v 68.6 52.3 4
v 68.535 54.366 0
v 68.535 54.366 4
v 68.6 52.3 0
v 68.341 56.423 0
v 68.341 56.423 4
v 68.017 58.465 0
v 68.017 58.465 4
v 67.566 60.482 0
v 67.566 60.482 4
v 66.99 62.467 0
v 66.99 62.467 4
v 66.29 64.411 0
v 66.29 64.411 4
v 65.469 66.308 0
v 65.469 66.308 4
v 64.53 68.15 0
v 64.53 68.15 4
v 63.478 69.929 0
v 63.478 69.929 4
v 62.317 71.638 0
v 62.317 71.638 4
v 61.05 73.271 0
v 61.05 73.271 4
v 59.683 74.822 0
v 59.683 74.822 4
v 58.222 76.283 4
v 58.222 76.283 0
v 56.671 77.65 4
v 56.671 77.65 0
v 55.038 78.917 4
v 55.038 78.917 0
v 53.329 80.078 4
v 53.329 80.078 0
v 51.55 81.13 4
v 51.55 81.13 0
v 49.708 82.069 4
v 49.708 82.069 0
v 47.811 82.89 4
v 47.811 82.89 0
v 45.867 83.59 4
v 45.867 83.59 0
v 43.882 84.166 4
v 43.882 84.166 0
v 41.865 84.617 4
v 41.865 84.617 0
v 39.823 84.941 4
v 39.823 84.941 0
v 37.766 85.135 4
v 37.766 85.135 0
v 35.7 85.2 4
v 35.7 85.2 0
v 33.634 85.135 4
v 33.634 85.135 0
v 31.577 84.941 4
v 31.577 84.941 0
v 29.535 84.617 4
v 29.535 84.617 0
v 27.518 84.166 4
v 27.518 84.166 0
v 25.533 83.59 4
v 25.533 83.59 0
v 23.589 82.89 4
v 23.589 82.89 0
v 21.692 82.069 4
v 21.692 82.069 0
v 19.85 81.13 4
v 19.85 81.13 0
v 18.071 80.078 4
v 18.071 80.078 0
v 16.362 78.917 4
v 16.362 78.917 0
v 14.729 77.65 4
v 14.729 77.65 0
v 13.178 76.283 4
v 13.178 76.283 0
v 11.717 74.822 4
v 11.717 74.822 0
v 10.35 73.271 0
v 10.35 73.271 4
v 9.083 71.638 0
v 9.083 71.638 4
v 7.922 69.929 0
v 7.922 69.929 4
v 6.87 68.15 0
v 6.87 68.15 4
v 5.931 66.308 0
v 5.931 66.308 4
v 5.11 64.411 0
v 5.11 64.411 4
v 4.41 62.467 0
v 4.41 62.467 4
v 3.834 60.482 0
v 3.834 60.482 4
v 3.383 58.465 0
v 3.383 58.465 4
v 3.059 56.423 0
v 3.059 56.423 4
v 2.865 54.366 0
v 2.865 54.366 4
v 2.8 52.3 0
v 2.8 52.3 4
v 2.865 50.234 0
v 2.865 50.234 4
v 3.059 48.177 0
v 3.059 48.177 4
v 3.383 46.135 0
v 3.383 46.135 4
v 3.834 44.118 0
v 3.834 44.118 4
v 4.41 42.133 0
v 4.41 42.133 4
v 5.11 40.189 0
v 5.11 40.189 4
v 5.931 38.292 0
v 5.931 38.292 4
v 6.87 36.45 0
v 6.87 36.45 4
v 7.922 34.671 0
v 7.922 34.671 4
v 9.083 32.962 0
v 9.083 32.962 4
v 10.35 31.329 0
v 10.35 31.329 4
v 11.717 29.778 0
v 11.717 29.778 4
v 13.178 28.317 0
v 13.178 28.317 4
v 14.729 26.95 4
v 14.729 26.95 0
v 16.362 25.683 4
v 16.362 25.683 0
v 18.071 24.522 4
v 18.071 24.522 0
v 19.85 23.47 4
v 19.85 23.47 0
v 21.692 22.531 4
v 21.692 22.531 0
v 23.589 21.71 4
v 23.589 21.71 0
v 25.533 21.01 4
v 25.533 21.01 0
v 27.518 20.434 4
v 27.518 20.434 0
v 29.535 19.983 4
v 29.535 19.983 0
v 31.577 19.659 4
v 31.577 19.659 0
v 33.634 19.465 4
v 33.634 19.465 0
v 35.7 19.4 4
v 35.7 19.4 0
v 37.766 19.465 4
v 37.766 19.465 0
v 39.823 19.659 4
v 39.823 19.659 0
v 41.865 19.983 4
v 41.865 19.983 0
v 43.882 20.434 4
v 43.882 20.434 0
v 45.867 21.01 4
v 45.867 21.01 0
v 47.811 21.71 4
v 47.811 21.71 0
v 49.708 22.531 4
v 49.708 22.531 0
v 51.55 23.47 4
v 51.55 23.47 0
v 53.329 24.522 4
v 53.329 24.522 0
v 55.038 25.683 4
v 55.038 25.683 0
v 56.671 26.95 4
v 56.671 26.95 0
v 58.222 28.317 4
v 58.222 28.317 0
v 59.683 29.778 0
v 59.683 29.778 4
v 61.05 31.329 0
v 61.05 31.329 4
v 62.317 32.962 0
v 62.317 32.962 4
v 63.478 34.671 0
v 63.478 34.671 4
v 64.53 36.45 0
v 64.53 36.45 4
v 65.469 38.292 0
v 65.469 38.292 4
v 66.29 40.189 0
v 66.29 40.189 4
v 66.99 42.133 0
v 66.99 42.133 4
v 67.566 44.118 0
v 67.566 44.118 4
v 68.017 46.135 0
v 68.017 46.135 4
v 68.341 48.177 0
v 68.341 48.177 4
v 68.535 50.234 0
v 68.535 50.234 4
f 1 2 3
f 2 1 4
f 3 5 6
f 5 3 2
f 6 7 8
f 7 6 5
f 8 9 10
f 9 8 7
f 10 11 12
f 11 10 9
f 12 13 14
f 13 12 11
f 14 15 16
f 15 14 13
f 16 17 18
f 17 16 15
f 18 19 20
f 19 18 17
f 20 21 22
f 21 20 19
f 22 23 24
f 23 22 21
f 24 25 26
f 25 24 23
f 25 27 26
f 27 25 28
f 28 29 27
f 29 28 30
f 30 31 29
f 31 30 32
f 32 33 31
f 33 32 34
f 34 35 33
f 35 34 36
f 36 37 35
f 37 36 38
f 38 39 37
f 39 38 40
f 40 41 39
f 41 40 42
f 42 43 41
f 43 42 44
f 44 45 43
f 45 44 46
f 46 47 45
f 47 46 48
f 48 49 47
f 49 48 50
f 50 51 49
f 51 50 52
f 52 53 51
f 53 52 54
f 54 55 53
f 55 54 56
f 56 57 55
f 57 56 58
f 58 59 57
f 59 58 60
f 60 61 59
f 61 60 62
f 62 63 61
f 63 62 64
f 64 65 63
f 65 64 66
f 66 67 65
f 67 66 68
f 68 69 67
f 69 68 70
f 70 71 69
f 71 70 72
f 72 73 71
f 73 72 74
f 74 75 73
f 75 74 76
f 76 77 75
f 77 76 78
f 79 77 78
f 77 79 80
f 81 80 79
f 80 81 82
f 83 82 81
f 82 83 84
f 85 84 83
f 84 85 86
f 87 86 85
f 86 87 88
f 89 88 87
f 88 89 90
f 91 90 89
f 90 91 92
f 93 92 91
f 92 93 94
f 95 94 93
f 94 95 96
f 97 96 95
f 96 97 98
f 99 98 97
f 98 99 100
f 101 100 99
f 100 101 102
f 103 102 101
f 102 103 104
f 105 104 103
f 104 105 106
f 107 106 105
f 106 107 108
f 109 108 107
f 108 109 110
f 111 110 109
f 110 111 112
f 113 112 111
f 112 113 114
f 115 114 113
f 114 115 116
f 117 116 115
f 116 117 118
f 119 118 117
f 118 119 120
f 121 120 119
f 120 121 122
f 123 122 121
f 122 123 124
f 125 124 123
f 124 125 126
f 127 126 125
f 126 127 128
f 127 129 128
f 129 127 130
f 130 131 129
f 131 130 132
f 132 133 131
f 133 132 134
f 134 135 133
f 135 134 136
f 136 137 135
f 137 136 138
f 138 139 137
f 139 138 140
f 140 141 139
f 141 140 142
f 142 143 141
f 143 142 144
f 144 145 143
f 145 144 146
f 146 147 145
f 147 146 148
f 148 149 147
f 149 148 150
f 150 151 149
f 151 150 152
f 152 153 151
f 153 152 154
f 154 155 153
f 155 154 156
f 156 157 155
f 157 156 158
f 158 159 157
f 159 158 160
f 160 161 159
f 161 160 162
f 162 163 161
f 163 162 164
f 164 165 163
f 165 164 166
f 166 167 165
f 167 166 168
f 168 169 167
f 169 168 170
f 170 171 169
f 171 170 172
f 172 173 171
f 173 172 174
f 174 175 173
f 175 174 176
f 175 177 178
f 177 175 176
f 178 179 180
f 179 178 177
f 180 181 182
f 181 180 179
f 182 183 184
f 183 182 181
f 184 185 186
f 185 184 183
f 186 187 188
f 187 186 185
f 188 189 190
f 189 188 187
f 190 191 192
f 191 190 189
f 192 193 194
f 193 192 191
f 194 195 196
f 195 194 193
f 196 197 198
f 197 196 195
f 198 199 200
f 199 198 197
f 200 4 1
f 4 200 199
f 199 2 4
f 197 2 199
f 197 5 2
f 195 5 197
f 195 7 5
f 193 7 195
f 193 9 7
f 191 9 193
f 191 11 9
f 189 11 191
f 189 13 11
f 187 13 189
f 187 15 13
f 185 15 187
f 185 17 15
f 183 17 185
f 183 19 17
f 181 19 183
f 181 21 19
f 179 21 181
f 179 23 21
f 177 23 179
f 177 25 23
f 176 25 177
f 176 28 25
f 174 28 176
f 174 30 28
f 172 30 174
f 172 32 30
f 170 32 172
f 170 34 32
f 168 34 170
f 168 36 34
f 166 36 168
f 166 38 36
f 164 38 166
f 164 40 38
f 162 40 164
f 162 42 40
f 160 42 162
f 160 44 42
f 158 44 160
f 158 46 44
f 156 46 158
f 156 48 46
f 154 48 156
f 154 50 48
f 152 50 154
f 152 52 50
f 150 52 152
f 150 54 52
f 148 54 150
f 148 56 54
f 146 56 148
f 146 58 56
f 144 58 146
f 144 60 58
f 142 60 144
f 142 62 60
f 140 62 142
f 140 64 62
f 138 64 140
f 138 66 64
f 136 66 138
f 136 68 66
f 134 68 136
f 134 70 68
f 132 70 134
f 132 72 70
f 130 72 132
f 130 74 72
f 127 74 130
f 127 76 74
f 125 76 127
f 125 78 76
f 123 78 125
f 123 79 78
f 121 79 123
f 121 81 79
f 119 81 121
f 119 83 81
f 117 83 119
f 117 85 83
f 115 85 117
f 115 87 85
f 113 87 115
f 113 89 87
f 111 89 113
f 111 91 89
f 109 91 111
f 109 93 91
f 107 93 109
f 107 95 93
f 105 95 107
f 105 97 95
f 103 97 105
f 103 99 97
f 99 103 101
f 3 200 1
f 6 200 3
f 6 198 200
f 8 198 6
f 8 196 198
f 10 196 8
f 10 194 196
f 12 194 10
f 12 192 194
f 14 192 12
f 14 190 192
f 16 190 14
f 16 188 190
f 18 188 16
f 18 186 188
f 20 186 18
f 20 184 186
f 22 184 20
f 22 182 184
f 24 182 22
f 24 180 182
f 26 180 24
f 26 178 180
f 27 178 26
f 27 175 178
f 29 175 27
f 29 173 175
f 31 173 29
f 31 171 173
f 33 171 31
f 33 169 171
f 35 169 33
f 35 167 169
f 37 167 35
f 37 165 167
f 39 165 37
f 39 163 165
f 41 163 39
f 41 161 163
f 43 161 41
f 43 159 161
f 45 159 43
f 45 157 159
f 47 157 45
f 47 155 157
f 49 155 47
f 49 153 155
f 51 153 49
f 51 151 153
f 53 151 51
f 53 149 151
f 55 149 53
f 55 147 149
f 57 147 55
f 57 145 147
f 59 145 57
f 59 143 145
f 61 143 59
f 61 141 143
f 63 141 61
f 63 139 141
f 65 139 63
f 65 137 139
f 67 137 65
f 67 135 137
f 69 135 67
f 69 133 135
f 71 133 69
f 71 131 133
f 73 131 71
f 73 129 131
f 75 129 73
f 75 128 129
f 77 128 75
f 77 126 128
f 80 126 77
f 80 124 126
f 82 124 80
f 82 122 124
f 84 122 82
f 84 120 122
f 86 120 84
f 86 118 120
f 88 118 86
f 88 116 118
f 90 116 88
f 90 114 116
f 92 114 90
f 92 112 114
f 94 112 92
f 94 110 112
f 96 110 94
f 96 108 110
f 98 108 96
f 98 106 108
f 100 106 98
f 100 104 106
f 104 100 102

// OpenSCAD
// rma 
//  noisebridge logo  5/21/2011


coin();


module coin(){
union(){
	translate([0,0,4])logo();
	translate([35.7,52.3,0])cylinder(h = 4, r = 32.9, center = false,$fn=100);
	
	}
}


module logo(){ 

linear_extrude(file = "Logo2.dxf",
  height = 6,convexity=5, center = false);
}
